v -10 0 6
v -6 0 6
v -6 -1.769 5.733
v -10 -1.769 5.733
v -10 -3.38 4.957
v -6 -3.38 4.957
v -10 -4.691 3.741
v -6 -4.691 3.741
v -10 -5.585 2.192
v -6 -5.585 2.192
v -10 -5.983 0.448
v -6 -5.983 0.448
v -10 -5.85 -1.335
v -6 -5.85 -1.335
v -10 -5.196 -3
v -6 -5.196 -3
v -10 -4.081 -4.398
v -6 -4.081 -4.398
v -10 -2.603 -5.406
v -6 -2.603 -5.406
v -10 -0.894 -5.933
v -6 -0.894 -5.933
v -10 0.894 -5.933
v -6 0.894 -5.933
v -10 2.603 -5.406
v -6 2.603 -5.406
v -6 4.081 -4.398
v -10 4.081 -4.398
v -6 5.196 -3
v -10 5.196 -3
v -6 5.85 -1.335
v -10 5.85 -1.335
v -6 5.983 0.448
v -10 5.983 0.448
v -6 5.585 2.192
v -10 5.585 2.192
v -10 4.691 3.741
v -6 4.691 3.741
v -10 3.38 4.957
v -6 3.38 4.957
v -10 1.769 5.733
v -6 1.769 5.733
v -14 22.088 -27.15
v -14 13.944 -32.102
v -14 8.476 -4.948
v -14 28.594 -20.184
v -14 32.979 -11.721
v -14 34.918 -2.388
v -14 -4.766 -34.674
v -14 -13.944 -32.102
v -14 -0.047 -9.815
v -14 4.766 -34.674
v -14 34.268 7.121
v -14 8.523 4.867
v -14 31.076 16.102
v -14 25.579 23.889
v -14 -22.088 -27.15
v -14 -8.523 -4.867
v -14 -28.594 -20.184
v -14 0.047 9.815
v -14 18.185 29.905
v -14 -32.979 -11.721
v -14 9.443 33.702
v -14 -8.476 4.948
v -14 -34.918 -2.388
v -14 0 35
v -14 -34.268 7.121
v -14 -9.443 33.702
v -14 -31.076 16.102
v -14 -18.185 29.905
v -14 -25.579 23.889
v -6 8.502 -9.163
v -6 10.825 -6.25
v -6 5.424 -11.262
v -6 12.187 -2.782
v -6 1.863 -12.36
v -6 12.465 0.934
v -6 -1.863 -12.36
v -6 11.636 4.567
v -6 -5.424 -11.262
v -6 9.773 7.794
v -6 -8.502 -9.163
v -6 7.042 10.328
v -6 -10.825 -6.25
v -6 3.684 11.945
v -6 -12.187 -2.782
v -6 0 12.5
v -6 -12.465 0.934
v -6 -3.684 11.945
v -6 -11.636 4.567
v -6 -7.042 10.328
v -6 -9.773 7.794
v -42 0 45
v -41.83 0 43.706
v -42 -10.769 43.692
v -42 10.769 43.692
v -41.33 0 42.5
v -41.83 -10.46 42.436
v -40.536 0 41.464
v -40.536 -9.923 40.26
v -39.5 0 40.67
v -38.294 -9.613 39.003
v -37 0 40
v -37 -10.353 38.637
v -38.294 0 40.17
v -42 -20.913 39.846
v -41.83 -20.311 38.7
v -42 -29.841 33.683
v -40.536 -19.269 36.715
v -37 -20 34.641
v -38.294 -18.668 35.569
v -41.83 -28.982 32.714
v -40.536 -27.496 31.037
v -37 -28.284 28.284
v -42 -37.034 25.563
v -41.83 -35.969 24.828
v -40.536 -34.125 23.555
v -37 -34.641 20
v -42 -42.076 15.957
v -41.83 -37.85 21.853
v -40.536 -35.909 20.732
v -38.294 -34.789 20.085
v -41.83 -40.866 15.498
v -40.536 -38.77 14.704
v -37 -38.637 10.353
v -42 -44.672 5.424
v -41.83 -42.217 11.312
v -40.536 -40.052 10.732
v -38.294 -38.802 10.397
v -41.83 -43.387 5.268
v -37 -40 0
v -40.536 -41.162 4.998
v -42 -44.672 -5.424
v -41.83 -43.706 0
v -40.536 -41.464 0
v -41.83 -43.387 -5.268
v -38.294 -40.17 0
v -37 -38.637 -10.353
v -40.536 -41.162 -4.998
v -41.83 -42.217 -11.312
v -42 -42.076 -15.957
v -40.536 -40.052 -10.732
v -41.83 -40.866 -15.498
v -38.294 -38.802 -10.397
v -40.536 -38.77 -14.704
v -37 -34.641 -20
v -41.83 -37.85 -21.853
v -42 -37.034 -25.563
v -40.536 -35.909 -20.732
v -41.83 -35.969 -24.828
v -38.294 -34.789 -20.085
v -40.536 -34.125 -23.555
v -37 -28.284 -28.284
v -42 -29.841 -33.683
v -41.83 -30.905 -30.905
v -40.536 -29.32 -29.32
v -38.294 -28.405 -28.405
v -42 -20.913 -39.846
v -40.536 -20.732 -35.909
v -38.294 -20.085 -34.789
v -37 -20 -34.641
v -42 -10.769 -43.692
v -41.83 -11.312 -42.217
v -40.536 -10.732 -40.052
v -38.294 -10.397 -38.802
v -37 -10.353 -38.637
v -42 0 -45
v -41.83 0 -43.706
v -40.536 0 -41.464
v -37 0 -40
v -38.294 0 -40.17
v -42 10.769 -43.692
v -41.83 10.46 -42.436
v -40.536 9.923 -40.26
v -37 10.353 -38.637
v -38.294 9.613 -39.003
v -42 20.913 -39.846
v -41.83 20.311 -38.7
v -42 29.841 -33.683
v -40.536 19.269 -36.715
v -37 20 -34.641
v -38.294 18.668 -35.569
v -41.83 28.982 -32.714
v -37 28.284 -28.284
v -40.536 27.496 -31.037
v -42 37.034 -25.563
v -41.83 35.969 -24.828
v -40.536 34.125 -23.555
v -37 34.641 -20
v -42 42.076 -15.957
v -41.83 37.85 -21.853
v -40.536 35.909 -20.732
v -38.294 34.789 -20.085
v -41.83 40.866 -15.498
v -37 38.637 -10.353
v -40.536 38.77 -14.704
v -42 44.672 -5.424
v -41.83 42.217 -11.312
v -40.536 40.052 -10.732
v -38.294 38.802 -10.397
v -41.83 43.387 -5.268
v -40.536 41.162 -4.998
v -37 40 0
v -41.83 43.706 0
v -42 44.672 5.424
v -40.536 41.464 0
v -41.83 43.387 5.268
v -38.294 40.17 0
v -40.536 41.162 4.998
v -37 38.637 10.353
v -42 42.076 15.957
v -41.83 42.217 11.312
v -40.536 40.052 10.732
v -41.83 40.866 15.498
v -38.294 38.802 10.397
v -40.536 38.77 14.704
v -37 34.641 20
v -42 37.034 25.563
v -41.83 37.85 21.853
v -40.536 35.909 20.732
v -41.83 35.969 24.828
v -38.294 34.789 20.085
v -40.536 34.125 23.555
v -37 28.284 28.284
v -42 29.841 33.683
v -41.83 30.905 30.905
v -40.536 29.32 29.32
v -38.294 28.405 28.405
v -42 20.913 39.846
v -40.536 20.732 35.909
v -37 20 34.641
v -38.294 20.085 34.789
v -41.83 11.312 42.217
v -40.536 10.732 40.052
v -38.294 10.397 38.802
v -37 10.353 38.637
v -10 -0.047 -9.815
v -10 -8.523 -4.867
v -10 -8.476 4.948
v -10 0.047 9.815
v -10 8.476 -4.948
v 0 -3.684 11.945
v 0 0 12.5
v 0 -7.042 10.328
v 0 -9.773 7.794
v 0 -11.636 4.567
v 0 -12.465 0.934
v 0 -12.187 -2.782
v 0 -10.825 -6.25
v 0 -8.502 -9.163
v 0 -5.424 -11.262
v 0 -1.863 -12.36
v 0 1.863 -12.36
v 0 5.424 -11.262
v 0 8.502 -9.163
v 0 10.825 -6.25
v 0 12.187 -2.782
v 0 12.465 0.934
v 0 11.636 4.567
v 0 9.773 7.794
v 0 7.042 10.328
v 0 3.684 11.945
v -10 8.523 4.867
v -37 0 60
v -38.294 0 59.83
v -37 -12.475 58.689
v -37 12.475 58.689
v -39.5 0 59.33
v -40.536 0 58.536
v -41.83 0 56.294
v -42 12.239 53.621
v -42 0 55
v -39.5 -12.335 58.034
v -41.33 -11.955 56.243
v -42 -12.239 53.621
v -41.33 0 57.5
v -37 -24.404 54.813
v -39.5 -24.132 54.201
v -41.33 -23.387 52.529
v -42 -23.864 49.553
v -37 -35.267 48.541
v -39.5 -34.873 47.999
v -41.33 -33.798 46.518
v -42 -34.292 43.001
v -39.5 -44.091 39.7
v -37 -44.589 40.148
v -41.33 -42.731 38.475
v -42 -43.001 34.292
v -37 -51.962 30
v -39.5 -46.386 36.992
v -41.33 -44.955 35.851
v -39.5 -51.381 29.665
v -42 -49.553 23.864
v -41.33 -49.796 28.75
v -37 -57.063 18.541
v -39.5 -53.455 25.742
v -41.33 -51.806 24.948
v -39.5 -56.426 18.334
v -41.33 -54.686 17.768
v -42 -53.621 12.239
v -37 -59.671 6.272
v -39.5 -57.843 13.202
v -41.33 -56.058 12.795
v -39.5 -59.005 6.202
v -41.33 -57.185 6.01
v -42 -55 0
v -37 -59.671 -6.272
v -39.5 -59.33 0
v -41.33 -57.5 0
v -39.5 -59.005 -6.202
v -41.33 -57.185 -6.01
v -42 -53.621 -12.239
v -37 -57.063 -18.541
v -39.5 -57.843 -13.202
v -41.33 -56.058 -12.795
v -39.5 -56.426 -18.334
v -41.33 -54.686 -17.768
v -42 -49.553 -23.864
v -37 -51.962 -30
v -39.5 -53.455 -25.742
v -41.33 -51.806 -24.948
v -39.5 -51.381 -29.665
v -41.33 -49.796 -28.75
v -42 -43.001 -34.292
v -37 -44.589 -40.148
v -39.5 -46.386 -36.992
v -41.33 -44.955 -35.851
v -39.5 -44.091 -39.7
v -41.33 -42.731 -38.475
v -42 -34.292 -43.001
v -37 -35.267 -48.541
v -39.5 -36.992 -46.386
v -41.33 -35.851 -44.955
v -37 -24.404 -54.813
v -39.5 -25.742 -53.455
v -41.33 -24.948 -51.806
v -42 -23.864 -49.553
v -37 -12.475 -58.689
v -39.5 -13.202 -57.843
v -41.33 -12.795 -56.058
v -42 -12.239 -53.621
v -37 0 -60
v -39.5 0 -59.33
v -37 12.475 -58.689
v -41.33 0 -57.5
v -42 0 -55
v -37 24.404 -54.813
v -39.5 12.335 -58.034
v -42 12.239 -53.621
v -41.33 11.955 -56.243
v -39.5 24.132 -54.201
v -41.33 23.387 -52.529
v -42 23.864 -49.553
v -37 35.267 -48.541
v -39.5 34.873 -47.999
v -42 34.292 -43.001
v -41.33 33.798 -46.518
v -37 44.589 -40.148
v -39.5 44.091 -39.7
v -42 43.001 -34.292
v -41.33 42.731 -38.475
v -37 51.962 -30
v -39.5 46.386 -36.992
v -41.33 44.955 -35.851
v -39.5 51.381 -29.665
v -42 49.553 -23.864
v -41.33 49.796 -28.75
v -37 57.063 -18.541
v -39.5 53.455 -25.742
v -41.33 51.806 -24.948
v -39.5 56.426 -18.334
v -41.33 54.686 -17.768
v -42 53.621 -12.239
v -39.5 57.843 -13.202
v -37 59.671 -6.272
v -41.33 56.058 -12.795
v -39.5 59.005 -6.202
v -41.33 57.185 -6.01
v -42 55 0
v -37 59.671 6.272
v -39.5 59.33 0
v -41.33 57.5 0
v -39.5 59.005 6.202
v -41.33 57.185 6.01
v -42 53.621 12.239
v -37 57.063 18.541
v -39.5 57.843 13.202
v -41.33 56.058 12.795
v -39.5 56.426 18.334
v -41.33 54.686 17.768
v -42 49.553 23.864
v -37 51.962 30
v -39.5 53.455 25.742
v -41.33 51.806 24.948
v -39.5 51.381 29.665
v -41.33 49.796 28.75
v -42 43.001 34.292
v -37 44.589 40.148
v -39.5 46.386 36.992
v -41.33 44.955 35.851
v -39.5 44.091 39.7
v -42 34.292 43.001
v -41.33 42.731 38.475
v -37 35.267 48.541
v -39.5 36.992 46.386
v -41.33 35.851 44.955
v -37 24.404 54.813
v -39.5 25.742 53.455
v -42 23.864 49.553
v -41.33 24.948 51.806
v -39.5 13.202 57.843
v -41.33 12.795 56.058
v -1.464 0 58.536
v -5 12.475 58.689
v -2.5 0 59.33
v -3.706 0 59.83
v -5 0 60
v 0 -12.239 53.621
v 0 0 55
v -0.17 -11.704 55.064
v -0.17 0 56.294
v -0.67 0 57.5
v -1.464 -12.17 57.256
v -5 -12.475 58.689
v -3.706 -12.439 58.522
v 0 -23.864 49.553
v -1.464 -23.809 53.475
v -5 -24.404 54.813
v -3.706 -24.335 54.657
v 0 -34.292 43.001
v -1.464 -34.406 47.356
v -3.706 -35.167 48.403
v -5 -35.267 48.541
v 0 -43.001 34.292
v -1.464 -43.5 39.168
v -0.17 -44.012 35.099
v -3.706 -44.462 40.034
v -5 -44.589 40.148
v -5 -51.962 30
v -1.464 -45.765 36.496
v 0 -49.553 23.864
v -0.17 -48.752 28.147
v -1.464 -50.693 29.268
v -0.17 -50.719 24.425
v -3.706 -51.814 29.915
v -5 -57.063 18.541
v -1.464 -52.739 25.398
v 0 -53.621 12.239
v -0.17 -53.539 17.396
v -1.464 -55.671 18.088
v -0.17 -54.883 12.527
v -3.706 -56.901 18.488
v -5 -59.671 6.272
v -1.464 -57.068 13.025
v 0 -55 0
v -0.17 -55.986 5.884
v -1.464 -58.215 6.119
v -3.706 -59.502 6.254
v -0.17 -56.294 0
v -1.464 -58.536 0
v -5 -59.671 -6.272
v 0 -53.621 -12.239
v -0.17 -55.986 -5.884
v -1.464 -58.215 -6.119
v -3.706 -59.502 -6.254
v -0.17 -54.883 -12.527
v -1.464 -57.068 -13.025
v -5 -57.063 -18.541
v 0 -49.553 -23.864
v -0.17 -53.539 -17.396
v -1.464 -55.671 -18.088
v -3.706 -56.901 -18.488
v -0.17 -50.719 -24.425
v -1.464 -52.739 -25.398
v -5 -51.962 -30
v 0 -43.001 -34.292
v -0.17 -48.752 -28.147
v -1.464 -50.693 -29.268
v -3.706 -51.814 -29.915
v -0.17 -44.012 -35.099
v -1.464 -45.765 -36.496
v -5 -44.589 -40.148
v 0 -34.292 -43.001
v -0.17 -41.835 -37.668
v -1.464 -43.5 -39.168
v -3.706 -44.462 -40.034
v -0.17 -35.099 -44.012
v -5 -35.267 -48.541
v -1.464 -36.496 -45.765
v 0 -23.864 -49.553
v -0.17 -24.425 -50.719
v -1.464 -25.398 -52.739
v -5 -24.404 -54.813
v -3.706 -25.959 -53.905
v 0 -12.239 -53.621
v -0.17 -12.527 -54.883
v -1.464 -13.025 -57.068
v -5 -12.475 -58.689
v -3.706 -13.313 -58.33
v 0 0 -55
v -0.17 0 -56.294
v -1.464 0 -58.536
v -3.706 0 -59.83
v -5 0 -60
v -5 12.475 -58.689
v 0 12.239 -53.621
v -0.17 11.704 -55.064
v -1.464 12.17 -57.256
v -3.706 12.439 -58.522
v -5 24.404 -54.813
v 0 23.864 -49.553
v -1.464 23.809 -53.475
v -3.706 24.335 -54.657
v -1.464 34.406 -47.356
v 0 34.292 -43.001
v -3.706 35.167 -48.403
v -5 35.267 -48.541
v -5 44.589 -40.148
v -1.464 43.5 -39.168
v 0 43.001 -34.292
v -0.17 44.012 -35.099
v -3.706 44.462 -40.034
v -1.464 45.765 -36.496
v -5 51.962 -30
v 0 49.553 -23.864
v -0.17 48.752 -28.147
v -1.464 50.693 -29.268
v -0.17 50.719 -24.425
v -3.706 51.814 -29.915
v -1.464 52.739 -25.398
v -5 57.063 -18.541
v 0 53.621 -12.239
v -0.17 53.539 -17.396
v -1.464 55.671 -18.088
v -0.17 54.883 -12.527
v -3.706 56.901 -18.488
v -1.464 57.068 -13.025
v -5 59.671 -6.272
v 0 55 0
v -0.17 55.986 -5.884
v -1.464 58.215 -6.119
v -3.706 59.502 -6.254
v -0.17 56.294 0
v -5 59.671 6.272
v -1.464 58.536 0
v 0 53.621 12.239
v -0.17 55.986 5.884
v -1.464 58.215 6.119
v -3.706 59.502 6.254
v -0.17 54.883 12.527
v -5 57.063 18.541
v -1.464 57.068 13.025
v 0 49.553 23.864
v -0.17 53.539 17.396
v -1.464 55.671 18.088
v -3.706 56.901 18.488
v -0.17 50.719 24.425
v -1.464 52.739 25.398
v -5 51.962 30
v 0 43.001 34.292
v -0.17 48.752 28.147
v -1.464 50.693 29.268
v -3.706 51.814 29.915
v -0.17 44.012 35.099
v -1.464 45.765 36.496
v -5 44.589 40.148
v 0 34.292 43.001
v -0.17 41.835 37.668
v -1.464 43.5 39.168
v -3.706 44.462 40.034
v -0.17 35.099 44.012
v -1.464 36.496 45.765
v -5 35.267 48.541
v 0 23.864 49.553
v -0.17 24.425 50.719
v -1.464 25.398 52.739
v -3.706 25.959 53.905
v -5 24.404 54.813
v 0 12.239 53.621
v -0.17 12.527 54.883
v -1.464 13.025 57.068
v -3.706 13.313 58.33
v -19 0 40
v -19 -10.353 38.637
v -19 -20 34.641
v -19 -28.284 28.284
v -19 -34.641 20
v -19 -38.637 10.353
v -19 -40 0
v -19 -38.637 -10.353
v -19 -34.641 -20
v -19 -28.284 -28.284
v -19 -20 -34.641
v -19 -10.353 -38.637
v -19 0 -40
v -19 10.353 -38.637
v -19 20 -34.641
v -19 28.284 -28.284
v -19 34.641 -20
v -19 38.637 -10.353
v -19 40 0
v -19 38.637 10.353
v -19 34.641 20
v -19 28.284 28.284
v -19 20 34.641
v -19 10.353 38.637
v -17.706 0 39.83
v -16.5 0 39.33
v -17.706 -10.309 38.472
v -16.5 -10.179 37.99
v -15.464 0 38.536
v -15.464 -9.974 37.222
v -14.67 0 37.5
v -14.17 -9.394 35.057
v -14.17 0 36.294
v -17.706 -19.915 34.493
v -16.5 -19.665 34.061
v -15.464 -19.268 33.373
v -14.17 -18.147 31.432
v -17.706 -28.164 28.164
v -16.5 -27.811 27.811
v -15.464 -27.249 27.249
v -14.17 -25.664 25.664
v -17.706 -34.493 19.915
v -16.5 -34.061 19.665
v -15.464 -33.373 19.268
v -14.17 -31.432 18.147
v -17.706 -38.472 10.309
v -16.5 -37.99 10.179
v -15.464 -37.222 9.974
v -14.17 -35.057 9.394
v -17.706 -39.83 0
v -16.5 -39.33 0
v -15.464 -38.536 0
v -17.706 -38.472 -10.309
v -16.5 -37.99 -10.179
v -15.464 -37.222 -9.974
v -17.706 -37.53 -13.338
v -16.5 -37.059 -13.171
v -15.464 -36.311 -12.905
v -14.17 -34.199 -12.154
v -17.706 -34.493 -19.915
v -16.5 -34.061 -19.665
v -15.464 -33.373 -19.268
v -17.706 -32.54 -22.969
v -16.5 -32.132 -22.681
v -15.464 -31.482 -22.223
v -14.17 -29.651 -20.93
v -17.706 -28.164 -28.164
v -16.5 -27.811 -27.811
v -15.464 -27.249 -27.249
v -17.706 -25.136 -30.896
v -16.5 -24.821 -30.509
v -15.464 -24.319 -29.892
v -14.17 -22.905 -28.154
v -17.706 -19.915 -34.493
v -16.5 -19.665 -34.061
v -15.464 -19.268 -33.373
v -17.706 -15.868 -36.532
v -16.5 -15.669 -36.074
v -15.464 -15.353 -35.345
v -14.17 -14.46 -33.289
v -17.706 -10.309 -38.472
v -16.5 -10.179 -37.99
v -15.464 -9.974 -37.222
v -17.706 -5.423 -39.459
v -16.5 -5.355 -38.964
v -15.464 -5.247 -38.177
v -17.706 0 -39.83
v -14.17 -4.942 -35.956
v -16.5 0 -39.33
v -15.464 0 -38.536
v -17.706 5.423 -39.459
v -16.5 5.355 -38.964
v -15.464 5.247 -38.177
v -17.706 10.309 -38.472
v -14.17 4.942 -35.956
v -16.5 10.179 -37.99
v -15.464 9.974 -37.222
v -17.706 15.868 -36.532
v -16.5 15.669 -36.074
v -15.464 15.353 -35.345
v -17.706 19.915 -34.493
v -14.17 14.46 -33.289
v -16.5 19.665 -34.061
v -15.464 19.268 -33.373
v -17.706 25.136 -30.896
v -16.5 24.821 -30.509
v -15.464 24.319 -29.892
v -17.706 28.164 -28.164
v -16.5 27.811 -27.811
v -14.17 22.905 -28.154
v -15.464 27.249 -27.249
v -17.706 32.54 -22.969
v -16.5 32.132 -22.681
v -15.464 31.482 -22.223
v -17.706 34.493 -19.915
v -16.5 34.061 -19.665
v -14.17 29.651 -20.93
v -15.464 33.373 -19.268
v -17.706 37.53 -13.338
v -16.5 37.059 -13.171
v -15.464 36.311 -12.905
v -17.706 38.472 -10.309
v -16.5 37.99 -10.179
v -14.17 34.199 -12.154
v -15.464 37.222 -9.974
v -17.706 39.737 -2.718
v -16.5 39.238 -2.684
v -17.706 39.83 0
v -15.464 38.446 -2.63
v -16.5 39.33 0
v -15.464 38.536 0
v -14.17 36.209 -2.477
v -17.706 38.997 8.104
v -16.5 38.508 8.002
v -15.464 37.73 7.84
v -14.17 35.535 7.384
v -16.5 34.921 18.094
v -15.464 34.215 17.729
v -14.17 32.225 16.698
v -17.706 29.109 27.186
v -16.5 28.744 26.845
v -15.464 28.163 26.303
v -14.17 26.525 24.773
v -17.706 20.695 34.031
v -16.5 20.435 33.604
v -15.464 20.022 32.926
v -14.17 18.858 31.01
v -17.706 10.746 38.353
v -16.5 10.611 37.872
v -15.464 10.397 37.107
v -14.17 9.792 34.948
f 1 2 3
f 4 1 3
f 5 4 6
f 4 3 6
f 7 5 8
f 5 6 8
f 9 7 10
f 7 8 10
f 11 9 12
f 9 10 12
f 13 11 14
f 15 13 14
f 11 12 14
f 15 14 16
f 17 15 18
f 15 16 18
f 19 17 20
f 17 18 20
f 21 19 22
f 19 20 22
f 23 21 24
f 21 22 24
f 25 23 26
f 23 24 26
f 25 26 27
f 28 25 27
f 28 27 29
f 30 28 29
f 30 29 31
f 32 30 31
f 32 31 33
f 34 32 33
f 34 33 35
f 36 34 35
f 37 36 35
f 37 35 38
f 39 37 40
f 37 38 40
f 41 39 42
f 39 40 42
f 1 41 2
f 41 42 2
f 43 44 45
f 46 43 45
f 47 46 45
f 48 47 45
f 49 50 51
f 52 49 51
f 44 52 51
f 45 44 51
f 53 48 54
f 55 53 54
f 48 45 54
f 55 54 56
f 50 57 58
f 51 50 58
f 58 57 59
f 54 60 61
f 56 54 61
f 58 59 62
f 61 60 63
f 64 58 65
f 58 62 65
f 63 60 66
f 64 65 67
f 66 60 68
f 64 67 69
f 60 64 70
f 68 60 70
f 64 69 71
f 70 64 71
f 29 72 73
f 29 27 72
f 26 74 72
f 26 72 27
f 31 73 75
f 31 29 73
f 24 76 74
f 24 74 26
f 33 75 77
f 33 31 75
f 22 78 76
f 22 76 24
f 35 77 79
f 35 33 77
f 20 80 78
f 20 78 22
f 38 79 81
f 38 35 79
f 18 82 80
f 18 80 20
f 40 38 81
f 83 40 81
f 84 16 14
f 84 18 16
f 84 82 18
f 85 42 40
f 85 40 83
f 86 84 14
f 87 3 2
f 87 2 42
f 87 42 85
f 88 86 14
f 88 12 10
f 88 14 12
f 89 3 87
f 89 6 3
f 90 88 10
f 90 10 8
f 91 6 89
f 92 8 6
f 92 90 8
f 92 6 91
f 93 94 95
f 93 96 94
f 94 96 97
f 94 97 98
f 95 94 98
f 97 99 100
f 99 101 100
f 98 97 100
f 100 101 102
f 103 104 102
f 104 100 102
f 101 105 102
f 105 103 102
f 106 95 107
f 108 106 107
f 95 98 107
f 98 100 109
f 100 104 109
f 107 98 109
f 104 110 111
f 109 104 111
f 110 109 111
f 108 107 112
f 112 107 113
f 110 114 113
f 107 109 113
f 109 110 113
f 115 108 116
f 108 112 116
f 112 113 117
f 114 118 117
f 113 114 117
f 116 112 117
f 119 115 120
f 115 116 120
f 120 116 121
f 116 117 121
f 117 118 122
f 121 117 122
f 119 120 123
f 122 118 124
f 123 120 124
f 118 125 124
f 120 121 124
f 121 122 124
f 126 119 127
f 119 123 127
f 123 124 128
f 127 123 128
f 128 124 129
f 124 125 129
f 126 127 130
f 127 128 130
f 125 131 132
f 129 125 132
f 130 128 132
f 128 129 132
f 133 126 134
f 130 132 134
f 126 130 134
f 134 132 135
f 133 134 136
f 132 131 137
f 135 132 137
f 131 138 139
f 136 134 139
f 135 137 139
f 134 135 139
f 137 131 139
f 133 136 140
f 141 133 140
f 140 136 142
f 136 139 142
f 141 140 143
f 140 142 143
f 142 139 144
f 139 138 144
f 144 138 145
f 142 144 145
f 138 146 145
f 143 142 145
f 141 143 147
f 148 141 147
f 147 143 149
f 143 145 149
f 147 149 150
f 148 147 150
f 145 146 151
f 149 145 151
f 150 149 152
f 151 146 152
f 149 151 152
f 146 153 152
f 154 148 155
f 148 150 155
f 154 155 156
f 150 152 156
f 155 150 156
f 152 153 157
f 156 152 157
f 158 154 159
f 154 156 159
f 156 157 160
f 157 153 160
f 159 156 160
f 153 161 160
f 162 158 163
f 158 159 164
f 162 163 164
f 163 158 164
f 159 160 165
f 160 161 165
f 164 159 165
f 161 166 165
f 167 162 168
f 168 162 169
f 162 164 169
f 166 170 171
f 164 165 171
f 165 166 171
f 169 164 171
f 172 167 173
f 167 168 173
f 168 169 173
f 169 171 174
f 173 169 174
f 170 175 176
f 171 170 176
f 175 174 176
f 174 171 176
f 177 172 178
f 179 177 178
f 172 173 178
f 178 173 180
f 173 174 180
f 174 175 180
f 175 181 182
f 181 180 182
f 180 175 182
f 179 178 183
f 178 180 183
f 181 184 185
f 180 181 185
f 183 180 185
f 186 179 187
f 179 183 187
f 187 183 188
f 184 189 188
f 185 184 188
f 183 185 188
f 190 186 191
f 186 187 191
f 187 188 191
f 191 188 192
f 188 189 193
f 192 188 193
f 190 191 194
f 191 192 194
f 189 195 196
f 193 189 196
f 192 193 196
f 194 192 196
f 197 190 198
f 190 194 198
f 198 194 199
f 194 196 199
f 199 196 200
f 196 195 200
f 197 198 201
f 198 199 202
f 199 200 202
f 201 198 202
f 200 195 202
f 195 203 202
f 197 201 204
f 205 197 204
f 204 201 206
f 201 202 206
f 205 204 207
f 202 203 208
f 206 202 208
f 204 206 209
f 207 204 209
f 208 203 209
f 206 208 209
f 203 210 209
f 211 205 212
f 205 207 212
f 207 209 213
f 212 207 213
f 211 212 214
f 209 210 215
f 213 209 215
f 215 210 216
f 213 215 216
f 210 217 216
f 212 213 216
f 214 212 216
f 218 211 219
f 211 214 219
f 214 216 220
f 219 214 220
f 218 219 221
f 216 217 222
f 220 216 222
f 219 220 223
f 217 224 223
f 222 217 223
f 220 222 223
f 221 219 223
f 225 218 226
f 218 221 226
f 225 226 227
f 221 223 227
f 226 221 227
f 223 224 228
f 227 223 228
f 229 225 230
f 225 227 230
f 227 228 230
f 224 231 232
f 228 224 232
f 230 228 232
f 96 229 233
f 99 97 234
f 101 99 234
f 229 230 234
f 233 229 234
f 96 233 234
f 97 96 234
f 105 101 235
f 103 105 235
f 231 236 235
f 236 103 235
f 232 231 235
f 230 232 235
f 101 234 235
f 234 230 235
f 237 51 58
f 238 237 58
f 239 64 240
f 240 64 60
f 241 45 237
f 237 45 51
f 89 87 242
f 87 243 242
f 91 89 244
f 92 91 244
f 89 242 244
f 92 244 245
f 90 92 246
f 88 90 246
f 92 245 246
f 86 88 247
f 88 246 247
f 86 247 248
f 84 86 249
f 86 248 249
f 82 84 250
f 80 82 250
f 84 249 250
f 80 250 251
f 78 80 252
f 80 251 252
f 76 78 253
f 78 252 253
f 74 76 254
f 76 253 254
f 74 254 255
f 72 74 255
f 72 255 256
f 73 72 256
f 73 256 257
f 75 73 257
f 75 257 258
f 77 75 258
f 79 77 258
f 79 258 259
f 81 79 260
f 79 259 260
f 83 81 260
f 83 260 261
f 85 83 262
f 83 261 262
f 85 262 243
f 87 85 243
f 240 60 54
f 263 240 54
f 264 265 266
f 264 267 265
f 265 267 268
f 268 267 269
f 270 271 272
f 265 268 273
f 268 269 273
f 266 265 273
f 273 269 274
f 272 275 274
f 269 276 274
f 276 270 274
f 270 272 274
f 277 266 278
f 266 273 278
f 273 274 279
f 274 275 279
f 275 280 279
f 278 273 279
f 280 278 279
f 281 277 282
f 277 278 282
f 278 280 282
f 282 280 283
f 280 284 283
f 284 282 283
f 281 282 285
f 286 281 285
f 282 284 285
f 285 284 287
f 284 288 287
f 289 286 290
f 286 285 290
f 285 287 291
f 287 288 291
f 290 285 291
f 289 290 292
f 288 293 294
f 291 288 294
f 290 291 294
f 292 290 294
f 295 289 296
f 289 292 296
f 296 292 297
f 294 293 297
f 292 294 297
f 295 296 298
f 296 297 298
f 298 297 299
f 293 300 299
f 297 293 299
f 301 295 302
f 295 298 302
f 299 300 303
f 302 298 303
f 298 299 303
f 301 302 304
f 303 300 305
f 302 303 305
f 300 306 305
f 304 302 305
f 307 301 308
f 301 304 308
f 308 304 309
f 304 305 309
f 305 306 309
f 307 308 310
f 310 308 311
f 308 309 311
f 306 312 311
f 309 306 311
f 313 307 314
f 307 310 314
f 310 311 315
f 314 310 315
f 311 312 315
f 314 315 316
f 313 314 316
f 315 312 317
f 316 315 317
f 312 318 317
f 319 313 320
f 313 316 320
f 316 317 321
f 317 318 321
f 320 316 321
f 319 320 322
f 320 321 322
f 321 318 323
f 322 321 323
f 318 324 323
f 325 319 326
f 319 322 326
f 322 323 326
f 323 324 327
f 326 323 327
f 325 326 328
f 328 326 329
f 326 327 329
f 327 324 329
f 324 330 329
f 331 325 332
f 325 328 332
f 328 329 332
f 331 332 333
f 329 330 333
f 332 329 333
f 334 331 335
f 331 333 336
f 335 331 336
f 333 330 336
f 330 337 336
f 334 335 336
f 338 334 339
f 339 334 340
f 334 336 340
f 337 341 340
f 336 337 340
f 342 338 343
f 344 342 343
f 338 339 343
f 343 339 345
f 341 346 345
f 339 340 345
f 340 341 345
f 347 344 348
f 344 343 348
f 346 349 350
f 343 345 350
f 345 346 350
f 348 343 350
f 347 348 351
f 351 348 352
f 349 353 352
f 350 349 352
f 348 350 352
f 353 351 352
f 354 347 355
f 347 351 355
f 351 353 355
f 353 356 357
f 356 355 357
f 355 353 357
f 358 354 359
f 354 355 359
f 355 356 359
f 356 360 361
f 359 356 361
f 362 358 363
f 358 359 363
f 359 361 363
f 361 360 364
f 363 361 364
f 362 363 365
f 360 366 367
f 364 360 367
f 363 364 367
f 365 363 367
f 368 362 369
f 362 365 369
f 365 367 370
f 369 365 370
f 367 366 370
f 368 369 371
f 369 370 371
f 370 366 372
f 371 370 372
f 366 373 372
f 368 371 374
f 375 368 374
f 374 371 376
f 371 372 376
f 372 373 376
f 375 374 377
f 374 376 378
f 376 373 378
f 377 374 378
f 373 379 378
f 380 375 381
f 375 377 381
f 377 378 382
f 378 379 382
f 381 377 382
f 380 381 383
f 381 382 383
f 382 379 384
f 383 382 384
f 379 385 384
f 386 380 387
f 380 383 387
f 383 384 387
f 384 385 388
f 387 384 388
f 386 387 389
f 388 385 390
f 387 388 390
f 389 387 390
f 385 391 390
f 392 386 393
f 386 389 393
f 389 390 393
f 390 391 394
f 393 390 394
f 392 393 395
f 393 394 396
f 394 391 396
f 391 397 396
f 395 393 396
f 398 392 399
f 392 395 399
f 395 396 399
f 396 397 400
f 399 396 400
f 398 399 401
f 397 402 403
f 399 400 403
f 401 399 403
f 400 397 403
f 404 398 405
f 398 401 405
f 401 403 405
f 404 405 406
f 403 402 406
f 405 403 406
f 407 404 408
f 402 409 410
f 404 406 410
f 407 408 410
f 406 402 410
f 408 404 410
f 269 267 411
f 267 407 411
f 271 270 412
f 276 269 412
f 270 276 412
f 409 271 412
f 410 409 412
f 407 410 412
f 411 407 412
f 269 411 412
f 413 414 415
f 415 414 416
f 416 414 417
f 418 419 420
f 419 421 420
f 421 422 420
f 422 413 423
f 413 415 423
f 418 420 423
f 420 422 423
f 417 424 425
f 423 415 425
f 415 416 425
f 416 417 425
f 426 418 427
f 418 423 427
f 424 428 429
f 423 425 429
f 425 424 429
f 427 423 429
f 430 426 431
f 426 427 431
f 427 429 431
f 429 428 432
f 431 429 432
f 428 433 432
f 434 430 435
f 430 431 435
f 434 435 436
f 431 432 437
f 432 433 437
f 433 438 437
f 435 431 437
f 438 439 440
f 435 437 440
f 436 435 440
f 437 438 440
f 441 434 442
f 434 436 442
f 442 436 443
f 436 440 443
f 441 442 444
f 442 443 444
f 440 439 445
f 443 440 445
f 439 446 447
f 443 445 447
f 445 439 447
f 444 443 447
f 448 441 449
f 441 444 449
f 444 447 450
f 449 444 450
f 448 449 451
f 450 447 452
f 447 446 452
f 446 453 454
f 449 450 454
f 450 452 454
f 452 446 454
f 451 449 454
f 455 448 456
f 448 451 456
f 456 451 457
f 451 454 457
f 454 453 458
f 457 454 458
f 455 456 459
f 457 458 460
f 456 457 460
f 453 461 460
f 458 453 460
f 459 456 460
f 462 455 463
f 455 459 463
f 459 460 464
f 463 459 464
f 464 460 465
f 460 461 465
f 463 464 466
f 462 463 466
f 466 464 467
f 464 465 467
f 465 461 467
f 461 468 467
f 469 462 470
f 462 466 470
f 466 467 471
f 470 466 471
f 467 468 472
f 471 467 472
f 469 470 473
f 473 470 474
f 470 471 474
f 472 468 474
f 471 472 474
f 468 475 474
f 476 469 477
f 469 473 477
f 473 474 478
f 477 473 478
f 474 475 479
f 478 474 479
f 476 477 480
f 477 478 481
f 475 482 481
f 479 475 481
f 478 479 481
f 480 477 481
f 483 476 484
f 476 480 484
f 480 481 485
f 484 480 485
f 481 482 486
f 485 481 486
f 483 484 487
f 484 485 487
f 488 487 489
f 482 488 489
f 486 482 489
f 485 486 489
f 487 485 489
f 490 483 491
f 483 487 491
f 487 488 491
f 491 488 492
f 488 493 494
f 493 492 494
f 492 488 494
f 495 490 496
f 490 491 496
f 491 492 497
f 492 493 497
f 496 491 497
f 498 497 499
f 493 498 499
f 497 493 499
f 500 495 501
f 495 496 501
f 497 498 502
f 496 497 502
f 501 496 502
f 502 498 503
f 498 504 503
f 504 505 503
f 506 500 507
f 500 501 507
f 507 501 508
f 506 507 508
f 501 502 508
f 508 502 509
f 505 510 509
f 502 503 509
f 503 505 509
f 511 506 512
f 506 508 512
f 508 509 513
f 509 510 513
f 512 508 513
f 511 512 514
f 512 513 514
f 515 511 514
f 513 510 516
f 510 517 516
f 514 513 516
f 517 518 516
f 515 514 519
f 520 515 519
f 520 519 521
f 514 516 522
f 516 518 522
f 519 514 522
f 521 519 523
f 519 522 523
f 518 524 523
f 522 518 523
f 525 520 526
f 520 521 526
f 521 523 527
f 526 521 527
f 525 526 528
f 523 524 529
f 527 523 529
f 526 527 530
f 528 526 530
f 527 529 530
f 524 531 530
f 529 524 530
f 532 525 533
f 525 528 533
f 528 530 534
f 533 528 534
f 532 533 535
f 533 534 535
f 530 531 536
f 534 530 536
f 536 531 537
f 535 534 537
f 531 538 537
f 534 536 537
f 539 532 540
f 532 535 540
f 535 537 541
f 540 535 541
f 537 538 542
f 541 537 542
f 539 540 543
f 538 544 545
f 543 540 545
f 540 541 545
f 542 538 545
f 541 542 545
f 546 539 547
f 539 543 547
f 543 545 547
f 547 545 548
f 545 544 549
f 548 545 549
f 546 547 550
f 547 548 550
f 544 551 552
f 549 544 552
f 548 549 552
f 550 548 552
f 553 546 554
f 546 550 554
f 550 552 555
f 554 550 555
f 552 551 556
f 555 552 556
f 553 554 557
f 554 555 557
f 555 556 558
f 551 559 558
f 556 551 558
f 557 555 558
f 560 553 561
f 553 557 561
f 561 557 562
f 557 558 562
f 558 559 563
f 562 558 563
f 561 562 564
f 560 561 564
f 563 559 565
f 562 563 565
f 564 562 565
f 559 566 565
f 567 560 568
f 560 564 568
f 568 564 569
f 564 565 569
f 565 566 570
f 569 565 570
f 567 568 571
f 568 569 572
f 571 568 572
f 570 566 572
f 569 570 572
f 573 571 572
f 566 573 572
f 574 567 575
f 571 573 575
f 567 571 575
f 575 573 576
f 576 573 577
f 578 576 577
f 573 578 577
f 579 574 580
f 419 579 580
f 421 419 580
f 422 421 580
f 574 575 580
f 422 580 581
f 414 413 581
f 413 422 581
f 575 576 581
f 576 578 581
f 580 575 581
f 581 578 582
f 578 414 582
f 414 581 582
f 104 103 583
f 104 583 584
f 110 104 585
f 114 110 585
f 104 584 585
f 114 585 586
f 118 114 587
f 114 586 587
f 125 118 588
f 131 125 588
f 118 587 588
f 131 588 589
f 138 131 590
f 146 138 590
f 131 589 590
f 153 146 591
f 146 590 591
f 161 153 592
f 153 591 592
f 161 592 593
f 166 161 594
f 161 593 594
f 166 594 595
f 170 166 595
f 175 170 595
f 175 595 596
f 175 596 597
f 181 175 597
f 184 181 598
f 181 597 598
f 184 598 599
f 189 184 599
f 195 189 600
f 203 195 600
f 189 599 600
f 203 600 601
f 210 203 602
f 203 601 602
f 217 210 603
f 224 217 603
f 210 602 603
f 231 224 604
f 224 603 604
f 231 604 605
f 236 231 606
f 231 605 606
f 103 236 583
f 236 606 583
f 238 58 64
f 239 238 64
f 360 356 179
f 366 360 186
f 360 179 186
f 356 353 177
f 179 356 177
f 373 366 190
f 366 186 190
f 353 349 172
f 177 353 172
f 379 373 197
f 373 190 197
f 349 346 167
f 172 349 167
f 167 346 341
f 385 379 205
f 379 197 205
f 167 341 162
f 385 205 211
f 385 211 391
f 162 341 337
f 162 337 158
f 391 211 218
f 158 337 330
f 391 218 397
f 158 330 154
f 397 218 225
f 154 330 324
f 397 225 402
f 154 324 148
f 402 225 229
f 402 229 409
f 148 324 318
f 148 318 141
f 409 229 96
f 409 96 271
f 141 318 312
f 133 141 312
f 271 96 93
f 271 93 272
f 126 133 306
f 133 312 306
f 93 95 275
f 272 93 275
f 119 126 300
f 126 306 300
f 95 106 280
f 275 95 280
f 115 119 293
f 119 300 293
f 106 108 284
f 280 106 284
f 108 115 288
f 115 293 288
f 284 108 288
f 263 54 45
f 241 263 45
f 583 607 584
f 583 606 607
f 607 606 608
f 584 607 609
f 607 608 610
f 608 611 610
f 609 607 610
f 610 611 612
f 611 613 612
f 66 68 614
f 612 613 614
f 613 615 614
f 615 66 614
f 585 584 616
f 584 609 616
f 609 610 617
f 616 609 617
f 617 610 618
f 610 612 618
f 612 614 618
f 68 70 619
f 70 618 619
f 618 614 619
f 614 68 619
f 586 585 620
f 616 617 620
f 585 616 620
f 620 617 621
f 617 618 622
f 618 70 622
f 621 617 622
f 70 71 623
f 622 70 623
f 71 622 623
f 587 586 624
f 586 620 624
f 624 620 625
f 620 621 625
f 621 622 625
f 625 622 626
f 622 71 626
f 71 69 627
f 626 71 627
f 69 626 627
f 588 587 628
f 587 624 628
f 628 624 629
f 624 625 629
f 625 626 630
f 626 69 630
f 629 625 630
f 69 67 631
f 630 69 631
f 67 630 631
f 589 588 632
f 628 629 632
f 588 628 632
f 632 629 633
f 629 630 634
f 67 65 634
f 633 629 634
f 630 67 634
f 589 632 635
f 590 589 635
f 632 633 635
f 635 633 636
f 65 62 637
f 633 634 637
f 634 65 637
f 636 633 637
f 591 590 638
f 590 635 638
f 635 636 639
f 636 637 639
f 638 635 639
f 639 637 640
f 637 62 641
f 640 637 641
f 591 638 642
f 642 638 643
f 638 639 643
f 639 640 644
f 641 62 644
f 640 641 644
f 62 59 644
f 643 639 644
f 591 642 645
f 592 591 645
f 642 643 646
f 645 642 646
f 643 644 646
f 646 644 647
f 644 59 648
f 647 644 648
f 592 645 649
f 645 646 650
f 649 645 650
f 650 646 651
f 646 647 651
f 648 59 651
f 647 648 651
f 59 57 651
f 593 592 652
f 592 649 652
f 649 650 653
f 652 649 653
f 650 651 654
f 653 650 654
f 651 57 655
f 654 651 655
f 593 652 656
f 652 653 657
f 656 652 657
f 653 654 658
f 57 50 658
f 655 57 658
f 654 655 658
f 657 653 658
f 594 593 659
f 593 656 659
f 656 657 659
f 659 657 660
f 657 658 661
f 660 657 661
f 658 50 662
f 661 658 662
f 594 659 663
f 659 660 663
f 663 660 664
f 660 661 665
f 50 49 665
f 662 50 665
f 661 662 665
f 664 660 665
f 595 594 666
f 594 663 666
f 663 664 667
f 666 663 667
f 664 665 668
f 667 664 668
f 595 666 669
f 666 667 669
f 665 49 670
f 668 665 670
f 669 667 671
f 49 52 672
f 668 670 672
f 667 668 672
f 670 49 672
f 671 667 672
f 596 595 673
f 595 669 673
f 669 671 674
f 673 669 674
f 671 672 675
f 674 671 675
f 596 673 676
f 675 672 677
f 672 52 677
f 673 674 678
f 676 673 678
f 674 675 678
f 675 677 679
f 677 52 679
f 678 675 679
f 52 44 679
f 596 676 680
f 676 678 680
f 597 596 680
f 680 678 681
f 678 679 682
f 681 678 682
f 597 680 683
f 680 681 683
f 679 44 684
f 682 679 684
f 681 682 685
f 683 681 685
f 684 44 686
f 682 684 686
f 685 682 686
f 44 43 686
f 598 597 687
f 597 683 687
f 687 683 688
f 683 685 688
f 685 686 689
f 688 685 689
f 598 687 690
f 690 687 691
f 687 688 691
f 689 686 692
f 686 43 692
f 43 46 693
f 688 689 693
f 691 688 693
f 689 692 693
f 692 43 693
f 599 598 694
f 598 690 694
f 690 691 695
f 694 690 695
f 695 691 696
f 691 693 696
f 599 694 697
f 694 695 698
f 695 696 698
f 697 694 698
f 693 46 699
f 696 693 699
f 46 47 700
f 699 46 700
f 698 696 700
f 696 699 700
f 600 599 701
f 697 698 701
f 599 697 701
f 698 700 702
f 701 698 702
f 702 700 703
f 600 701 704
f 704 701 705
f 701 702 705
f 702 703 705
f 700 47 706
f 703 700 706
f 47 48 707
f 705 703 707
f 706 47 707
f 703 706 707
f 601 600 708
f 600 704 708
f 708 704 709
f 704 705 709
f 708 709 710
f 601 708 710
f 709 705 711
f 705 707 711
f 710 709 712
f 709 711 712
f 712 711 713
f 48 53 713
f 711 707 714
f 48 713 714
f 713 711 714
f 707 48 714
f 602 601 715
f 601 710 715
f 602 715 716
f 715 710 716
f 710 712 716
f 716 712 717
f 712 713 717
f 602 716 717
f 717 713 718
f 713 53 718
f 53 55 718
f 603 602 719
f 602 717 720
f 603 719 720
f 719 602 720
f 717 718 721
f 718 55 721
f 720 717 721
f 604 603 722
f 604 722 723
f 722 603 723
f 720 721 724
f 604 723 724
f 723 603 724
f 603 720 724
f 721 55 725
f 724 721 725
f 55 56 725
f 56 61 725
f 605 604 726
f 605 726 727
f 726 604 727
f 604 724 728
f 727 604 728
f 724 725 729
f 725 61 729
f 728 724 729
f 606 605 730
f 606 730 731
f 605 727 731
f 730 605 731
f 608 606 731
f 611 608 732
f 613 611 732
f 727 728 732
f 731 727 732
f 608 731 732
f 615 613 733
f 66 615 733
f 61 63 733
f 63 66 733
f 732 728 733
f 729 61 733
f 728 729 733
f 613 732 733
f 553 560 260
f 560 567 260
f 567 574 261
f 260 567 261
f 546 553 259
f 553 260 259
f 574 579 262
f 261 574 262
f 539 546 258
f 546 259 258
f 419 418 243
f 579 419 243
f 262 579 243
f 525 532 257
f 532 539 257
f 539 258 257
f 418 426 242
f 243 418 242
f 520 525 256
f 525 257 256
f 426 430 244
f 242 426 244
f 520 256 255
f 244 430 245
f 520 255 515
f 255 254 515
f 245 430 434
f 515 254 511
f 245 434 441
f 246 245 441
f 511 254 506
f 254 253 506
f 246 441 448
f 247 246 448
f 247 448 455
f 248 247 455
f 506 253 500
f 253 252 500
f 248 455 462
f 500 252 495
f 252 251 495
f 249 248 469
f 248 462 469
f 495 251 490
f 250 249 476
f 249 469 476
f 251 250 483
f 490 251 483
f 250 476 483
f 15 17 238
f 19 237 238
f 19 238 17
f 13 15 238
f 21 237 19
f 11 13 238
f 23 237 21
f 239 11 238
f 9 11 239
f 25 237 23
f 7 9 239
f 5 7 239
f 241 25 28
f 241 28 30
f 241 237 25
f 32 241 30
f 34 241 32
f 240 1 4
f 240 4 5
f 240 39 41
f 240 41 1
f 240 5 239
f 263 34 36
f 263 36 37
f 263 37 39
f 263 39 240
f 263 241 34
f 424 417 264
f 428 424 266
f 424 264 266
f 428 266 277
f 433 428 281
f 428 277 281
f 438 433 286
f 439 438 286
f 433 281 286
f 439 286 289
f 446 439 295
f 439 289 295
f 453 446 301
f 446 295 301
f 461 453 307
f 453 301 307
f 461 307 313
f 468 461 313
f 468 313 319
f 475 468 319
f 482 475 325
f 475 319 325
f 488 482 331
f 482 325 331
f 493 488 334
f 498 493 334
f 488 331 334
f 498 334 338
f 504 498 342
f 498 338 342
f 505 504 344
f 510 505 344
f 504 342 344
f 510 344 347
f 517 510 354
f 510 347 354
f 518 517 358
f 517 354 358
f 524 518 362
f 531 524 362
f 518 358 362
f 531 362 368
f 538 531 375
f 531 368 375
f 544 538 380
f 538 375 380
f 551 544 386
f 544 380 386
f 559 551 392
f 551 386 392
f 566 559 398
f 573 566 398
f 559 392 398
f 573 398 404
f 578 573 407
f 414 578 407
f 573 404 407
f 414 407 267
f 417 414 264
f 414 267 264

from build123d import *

# Parameters (mm, degrees)
CUT_EXTRUDE1_DEPTH = 4
SKETCH3_W          = 6
SKETCH3_H          = 12.5


with BuildPart() as part:
    # Sketch1 → Revolve1 (revolve)
    with BuildSketch(Plane.XY, mode=Mode.PRIVATE) as revolve1_sk:
        with BuildLine():
            Line((0, -6), (0, -55))
            ThreePointArc((0, -55), (-1.464466094, -58.535533906), (-5, -60))
            Line((-5, -60), (-37, -60))
            ThreePointArc((-37, -60), (-40.535533906, -58.535533906), (-42, -55))
            Line((-42, -55), (-42, -45))
            ThreePointArc((-42, -45), (-40.535533906, -41.464466094), (-37, -40))
            Line((-37, -40), (-19, -40))
            ThreePointArc((-19, -40), (-15.464466094, -38.535533906), (-14, -35))
            Line((-14, -35), (-14, -6))
            Line((-14, -6), (0, -6))
        make_face()
    revolve(revolve1_sk.sketch.rotate(Axis((-33.627906977, 0, 0), (1, 0, 0)), 270), axis=Axis((-33.627906977, 0, 0), (1, 0, 0)))

    # Sketch2 → Cut-Extrude1 (cut)
    with BuildSketch(Plane.ZY.offset(14)):
        Polygon((4.948031545, -8.47645664), (9.814842556, 0.046892697), (4.866811012, 8.523349336), (-4.948031545, 8.47645664), (-9.814842556, -0.046892697), (-4.866811012, -8.523349336), align=None)
    extrude(amount=-CUT_EXTRUDE1_DEPTH, mode=Mode.SUBTRACT)

    # Sketch3 → Cut-Revolve1 (revolve, cut)
    with BuildSketch(Plane.XY, mode=Mode.PRIVATE) as cut_revolve1_sk:
        with Locations((-3, -6.25)):
            Rectangle(SKETCH3_W, SKETCH3_H)
    revolve(cut_revolve1_sk.sketch.rotate(Axis((-6, 0, 0), (1, 0, 0)), 270), axis=Axis((-6, 0, 0), (1, 0, 0)), mode=Mode.SUBTRACT)


solid = part.part
